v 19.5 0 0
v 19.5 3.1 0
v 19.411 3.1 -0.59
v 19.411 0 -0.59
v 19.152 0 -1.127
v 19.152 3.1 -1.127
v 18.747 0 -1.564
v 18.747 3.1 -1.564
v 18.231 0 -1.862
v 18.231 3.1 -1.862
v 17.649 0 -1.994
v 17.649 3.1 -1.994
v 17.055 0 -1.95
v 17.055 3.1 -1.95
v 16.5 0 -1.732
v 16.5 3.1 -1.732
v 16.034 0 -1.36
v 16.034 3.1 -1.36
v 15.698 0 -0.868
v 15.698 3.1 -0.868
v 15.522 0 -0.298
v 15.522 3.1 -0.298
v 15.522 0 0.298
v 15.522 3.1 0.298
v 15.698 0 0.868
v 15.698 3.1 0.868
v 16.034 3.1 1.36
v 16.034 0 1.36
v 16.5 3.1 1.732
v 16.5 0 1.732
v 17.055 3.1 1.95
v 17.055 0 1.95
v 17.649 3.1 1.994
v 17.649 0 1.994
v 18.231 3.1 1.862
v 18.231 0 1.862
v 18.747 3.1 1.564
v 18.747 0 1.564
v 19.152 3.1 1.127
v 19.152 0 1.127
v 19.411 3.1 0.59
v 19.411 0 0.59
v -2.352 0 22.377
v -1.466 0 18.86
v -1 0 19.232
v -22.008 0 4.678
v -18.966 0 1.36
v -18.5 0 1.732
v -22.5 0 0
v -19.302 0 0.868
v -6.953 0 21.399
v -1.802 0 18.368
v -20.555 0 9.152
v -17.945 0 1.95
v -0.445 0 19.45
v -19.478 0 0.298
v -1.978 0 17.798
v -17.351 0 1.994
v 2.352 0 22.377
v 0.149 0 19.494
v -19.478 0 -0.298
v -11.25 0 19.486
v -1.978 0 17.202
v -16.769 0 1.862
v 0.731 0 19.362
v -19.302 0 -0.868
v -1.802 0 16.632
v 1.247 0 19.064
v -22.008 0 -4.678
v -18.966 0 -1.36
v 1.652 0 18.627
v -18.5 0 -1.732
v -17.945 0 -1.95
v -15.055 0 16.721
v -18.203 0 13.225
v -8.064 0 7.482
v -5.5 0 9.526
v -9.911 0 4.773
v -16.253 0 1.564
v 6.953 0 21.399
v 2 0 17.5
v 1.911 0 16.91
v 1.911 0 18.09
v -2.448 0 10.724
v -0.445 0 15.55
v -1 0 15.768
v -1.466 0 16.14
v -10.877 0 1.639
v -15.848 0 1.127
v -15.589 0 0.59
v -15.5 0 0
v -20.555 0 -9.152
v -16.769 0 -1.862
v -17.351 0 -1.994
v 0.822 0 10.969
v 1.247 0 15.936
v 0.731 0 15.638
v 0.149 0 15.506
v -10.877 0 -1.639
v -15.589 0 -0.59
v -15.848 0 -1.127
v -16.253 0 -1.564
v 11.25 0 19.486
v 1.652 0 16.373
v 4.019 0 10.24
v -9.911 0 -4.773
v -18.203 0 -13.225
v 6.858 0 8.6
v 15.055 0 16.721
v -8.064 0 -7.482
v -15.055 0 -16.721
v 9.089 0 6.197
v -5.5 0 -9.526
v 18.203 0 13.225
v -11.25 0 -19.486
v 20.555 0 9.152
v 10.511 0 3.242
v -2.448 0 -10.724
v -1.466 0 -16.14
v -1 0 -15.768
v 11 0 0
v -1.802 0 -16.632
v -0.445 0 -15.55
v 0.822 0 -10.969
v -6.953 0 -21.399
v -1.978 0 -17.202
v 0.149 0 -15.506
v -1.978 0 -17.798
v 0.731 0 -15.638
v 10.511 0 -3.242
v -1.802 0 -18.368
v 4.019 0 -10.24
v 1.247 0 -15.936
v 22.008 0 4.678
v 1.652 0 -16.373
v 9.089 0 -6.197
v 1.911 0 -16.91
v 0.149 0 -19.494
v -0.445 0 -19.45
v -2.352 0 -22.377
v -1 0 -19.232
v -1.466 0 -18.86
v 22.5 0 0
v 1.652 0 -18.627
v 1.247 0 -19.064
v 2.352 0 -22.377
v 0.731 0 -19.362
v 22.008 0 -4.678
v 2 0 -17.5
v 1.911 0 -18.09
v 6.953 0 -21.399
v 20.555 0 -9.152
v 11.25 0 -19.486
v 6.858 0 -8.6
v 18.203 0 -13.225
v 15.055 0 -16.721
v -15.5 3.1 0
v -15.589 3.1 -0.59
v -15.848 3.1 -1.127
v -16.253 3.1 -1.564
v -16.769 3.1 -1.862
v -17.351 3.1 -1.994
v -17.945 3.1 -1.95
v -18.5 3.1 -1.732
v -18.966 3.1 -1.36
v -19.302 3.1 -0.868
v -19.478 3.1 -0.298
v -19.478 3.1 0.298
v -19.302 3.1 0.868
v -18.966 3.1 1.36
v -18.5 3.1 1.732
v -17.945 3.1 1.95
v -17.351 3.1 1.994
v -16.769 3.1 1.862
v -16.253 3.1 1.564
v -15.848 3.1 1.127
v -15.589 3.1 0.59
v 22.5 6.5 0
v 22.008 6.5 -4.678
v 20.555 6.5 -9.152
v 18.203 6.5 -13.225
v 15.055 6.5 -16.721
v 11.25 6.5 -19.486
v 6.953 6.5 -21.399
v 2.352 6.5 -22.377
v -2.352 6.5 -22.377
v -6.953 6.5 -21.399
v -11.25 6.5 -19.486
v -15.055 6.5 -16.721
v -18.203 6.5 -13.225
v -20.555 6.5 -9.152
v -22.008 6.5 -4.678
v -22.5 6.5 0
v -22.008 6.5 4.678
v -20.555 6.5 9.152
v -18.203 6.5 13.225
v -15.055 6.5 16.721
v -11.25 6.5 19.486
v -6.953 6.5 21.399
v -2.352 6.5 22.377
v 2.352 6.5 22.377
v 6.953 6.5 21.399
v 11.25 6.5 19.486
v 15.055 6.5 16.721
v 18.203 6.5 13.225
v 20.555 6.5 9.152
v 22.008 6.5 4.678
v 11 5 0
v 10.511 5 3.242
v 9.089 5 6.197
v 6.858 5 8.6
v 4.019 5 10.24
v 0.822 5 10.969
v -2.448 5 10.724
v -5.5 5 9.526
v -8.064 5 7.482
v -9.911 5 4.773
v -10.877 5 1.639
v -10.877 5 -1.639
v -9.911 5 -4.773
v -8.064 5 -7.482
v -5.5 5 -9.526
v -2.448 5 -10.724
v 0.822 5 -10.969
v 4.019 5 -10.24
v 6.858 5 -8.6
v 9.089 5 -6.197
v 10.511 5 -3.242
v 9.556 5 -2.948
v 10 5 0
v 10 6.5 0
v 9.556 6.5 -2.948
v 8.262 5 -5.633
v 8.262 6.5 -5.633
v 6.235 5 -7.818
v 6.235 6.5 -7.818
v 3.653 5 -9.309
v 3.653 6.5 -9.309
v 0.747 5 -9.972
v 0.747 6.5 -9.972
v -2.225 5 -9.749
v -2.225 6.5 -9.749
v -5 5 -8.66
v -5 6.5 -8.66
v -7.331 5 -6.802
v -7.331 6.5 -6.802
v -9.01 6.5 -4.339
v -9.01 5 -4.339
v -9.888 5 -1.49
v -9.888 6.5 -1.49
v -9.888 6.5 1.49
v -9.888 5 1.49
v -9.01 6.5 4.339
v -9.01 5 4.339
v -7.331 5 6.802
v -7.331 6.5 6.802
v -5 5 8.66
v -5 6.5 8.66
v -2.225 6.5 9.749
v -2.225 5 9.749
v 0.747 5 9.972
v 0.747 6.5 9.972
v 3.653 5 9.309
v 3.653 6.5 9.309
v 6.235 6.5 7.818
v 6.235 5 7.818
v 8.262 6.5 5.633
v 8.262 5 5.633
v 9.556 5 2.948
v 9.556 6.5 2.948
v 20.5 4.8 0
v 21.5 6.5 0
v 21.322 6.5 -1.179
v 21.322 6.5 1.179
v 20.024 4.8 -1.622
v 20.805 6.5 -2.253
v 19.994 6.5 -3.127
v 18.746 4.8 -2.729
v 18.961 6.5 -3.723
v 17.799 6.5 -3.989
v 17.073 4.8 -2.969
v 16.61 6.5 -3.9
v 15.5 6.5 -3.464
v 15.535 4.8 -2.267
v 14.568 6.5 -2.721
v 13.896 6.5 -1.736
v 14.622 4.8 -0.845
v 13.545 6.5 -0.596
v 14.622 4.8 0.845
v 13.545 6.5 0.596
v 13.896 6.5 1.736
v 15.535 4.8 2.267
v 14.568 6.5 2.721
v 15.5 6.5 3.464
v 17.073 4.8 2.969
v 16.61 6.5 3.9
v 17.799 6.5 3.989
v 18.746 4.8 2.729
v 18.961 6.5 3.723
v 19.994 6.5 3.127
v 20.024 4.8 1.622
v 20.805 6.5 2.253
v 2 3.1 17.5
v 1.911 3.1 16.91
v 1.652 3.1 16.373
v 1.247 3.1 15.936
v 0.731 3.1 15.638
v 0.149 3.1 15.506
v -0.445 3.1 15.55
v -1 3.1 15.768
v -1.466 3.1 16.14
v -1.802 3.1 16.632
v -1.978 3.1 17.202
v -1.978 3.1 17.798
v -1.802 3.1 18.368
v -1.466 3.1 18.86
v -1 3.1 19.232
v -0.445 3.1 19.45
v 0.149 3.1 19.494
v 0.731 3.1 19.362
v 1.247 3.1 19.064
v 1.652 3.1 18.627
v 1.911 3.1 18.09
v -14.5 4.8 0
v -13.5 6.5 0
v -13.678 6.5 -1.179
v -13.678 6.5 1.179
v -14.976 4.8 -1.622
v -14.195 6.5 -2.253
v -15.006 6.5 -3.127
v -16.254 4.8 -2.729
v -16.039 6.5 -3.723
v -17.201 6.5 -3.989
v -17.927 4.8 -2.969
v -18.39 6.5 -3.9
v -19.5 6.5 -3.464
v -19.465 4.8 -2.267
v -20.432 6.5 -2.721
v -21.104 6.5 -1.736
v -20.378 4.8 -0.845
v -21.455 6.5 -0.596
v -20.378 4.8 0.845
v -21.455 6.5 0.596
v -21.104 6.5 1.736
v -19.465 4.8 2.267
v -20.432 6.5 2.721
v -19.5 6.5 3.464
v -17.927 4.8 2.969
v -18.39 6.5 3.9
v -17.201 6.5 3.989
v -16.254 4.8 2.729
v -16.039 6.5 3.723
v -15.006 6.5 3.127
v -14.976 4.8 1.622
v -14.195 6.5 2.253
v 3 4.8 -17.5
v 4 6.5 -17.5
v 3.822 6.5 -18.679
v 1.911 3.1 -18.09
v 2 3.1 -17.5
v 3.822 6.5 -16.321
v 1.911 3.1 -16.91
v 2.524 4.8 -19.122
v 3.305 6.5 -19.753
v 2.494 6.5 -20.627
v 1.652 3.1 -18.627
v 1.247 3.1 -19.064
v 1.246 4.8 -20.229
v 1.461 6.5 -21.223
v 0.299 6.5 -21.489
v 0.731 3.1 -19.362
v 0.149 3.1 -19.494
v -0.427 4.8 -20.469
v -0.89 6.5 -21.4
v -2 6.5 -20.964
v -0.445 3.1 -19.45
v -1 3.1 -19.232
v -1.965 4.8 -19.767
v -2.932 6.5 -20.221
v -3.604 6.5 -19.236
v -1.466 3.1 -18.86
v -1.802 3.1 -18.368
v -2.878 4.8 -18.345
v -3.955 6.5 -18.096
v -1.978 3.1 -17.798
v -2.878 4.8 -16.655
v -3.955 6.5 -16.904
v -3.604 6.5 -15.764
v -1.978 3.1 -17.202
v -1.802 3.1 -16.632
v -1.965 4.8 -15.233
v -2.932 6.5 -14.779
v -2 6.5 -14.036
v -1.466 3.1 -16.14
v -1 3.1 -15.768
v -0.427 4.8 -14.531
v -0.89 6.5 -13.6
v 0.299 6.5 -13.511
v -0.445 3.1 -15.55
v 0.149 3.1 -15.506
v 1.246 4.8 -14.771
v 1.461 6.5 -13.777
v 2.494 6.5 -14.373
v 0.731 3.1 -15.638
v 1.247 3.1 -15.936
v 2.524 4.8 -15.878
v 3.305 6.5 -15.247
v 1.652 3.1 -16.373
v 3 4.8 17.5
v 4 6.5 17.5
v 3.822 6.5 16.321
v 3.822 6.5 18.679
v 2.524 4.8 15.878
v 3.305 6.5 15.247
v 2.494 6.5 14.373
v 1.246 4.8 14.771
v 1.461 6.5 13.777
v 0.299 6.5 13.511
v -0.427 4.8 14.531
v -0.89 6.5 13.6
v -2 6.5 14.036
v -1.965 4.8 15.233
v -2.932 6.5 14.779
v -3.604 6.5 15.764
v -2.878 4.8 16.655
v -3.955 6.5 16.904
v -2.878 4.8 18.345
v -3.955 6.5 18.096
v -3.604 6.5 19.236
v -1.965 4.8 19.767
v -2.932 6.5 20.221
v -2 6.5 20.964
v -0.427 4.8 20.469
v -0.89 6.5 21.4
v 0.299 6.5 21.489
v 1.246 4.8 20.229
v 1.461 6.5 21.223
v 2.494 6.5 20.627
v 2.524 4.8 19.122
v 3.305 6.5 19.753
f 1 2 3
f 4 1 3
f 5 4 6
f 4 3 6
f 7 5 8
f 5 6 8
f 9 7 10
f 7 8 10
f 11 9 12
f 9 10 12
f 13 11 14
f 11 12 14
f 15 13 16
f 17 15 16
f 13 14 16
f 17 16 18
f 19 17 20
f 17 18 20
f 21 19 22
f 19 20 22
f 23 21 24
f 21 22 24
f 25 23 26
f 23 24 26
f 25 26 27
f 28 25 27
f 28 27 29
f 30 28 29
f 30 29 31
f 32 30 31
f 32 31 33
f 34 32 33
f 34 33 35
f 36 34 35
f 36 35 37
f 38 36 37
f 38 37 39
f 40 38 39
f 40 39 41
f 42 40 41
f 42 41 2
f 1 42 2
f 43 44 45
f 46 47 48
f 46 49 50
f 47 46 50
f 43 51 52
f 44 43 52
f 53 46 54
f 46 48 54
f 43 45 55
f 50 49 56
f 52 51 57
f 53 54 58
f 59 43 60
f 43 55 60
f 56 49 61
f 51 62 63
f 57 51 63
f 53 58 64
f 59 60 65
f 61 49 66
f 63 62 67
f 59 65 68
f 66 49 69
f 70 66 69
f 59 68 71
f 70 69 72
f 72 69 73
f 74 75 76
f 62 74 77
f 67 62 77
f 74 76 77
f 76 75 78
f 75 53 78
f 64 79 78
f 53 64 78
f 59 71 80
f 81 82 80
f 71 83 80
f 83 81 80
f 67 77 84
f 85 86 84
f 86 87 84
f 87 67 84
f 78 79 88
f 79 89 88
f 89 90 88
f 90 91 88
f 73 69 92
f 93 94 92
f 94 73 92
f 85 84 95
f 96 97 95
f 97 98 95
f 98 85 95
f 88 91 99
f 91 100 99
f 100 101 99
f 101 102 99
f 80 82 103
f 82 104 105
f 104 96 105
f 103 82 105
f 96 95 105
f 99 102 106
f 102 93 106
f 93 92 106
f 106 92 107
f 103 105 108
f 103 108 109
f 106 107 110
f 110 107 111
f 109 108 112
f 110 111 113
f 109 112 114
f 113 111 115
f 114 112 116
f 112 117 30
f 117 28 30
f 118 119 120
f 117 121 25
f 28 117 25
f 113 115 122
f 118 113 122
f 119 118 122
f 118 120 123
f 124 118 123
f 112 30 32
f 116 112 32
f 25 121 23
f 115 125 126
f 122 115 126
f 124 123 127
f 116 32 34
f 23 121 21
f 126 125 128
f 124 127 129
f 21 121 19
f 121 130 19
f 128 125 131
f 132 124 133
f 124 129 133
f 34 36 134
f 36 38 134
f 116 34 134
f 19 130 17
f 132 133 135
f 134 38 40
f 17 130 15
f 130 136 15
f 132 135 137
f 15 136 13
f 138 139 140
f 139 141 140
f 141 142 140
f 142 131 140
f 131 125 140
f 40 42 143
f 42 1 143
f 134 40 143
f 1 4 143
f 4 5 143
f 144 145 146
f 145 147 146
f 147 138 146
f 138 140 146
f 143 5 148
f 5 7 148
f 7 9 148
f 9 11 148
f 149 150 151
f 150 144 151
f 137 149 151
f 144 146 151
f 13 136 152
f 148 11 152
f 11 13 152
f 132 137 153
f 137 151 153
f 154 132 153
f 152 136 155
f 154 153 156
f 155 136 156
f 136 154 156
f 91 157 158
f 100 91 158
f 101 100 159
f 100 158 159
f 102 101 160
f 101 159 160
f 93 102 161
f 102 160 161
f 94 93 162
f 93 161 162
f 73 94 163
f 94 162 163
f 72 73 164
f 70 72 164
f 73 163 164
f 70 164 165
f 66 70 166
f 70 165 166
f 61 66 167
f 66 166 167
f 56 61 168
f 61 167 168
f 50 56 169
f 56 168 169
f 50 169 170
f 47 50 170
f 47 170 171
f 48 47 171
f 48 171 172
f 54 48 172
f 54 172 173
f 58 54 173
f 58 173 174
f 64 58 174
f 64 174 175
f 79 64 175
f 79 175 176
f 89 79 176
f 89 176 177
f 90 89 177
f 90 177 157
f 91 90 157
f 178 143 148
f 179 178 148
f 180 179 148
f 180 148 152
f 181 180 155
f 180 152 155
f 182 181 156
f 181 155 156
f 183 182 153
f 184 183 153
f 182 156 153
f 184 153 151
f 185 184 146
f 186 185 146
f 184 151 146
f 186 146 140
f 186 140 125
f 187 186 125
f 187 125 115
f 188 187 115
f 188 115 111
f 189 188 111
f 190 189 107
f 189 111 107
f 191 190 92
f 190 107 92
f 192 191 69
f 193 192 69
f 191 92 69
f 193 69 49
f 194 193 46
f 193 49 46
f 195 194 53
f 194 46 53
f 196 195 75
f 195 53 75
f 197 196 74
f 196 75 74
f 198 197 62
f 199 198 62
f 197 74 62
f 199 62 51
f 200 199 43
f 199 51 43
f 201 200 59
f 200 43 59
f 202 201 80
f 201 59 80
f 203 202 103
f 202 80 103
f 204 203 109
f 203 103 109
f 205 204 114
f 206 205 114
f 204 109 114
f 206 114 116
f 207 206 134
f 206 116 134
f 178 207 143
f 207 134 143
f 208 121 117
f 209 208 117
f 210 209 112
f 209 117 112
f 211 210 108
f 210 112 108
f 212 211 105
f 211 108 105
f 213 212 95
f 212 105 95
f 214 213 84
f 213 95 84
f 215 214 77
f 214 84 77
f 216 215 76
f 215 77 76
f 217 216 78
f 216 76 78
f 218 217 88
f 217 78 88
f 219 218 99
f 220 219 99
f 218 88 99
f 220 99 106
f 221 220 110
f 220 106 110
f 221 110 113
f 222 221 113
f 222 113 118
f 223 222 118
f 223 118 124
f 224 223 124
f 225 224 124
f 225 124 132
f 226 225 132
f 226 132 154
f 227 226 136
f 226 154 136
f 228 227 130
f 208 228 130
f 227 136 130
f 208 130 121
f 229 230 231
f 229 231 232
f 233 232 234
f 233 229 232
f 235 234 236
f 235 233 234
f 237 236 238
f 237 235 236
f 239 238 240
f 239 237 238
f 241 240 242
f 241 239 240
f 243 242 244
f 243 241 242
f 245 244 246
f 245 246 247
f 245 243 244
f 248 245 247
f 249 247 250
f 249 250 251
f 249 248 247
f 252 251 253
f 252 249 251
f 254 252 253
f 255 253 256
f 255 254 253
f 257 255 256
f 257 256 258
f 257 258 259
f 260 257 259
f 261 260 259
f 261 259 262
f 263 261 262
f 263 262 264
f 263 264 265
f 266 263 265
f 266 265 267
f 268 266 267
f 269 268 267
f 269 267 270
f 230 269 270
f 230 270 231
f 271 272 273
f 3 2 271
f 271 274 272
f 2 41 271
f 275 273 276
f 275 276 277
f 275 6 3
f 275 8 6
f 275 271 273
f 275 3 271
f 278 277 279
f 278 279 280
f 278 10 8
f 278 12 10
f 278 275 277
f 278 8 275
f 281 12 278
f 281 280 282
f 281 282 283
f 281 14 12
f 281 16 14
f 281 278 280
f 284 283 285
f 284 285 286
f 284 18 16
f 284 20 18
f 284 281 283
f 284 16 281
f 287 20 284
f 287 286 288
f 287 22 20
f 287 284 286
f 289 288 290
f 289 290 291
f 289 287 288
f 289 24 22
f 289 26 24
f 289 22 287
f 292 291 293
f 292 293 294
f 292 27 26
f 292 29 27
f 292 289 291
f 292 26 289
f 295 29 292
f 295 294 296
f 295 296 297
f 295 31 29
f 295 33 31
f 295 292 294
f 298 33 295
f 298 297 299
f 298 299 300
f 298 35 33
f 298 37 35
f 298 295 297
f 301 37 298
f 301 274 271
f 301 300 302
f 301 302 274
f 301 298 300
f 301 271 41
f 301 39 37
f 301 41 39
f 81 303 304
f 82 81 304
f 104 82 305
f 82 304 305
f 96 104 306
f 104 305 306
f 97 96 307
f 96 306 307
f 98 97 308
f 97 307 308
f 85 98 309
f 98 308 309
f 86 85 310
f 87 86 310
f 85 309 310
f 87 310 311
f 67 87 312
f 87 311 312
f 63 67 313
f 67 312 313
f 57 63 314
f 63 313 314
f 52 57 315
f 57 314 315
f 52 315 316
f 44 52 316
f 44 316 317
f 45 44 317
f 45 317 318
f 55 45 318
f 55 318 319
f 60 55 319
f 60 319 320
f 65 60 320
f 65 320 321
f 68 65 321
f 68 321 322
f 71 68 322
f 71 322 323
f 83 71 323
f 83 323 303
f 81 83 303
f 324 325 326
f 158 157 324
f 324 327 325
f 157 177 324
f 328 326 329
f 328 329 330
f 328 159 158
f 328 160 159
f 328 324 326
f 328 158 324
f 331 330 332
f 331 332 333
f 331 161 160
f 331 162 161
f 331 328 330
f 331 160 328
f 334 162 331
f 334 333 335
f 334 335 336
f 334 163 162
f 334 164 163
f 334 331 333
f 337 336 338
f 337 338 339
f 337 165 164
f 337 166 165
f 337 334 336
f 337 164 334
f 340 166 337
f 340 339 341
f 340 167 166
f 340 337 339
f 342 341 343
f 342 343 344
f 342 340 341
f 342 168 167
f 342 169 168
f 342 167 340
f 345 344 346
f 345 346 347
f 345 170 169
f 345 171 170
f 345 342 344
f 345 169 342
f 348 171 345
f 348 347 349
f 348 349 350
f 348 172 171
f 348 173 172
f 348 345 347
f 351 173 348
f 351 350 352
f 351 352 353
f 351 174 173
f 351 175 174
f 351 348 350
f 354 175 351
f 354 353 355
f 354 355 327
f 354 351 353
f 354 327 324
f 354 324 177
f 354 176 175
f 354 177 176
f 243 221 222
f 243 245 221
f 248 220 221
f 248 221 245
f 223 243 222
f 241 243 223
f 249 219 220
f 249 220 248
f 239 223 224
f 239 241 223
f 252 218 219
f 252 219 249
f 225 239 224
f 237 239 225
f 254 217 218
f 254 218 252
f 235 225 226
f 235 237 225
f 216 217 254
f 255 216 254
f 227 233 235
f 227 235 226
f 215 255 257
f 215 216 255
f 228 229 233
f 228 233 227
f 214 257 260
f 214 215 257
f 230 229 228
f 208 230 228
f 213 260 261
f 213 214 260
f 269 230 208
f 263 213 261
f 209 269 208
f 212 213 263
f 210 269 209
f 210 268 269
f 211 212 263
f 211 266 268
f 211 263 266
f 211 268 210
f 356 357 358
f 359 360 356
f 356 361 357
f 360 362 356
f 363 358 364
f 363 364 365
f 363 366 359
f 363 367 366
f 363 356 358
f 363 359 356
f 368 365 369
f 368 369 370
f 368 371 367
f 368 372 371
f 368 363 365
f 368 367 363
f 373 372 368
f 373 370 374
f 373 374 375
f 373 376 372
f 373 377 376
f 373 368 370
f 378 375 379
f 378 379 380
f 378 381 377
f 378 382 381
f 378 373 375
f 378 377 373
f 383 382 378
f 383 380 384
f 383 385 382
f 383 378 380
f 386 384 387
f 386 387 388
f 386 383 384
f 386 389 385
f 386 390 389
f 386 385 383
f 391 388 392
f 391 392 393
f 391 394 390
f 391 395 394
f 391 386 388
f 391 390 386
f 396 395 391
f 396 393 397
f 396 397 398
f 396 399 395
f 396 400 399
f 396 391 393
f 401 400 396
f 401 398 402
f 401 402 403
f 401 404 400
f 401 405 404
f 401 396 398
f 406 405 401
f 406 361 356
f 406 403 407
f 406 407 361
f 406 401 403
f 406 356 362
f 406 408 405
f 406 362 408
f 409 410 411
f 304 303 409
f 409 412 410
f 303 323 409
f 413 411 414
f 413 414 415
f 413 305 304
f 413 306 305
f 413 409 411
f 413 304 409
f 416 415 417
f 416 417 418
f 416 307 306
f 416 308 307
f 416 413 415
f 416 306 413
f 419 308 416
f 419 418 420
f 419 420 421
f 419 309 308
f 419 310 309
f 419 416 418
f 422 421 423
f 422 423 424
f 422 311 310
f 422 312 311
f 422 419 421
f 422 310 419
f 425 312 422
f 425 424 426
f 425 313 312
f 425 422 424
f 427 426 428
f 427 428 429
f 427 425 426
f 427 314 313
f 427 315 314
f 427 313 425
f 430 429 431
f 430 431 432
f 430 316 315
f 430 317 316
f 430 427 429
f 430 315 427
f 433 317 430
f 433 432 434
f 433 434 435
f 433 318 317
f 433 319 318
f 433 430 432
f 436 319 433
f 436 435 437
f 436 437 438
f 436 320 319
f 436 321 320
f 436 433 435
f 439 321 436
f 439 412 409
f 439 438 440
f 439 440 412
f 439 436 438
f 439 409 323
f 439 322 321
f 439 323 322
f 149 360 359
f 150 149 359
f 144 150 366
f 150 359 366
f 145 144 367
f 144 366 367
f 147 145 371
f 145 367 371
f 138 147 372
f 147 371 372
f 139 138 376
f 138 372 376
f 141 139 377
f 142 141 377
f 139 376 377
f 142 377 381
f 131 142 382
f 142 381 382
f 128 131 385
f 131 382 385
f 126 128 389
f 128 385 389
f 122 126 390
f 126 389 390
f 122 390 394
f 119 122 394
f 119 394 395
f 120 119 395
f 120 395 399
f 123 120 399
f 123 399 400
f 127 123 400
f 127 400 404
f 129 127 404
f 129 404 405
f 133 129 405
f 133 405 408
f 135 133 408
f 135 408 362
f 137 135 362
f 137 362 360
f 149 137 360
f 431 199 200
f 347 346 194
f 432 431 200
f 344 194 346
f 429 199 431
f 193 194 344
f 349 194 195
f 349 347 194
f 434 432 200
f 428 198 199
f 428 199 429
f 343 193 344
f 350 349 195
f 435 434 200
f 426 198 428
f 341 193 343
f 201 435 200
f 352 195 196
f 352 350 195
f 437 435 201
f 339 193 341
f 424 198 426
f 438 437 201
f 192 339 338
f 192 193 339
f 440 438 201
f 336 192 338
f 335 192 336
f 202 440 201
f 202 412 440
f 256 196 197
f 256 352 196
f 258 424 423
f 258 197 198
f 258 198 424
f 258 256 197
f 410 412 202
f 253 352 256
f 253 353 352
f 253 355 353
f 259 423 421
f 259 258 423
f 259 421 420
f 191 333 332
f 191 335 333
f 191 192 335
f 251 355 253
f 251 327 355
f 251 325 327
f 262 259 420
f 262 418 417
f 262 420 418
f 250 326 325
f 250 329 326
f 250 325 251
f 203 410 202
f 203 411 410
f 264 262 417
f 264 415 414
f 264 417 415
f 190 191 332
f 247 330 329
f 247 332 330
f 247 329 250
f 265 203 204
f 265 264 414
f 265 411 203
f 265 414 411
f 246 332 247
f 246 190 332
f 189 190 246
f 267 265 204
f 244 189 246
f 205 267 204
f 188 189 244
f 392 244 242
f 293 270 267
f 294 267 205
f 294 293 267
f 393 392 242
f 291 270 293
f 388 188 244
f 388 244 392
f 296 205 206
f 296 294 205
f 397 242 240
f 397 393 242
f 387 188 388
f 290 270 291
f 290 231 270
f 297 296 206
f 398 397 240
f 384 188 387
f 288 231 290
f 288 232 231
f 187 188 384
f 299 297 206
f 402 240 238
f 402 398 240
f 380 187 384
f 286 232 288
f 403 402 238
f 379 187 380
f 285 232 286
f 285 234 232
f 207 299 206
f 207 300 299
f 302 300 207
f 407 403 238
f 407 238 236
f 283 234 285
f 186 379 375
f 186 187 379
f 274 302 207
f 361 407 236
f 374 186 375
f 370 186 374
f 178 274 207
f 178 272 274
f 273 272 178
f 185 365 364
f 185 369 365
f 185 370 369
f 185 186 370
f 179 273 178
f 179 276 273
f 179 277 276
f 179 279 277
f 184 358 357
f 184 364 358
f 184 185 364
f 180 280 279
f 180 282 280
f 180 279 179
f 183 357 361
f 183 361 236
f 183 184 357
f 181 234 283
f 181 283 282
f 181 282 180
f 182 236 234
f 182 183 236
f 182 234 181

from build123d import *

# Parameters (mm, degrees)
SKETCH_1_R          = 22.5
SKETCH_1_R_2        = 10
EXTRUDE_1_DEPTH     = 6.5
SKETCH_2_R          = 2
CUT_EXTRUDE_1_DEPTH = 7.5
SKETCH_3_R          = 11
CUT_EXTRUDE_2_DEPTH = 5
CHAMFER_1_SIZE      = 2
CHAMFER_1_SIZE2     = 3.4


with BuildPart() as part:
    # 草图1 → 凸台-拉伸1 (new body)
    with BuildSketch(Plane(origin=(0, 0, 0), x_dir=(1, 0, 0), z_dir=(0, 1, 0))):
        Circle(SKETCH_1_R)
        Circle(SKETCH_1_R_2, mode=Mode.SUBTRACT)
    extrude(amount=EXTRUDE_1_DEPTH)

    # 草图2 → 切除-拉伸1 (cut, through all)
    with BuildSketch(Plane(origin=(0, 6.5, 0), x_dir=(1, 0, 0), z_dir=(0, 1, 0))):
        with Locations((0, 17.5)):
            Circle(SKETCH_2_R)
        with Locations((17.5, 0)):
            Circle(SKETCH_2_R)
        with Locations((0, -17.5)):
            Circle(SKETCH_2_R)
        with Locations((-17.5, 0)):
            Circle(SKETCH_2_R)
    extrude(amount=-CUT_EXTRUDE_1_DEPTH, mode=Mode.SUBTRACT)

    # 草图3 → 切除-拉伸2 (cut)
    with BuildSketch(Plane.XZ):
        Circle(SKETCH_3_R)
    extrude(amount=-CUT_EXTRUDE_2_DEPTH, mode=Mode.SUBTRACT)

    # 倒角1
    chamfer_1_edges = [part.edges().sort_by_distance(p)[0] for p in [
        (-2, 6.5, -17.5),
        (15.5, 6.5, 0),
        (-2, 6.5, 17.5),
        (-19.5, 6.5, 0),
    ]]
    chamfer_1_side = [part.faces().sort_by_distance(p)[0] for p in [
        (-21.863603897, 6.5, 0),
    ]]
    chamfer(chamfer_1_edges, length=CHAMFER_1_SIZE, length2=CHAMFER_1_SIZE2, reference=chamfer_1_side[0])


solid = part.part
